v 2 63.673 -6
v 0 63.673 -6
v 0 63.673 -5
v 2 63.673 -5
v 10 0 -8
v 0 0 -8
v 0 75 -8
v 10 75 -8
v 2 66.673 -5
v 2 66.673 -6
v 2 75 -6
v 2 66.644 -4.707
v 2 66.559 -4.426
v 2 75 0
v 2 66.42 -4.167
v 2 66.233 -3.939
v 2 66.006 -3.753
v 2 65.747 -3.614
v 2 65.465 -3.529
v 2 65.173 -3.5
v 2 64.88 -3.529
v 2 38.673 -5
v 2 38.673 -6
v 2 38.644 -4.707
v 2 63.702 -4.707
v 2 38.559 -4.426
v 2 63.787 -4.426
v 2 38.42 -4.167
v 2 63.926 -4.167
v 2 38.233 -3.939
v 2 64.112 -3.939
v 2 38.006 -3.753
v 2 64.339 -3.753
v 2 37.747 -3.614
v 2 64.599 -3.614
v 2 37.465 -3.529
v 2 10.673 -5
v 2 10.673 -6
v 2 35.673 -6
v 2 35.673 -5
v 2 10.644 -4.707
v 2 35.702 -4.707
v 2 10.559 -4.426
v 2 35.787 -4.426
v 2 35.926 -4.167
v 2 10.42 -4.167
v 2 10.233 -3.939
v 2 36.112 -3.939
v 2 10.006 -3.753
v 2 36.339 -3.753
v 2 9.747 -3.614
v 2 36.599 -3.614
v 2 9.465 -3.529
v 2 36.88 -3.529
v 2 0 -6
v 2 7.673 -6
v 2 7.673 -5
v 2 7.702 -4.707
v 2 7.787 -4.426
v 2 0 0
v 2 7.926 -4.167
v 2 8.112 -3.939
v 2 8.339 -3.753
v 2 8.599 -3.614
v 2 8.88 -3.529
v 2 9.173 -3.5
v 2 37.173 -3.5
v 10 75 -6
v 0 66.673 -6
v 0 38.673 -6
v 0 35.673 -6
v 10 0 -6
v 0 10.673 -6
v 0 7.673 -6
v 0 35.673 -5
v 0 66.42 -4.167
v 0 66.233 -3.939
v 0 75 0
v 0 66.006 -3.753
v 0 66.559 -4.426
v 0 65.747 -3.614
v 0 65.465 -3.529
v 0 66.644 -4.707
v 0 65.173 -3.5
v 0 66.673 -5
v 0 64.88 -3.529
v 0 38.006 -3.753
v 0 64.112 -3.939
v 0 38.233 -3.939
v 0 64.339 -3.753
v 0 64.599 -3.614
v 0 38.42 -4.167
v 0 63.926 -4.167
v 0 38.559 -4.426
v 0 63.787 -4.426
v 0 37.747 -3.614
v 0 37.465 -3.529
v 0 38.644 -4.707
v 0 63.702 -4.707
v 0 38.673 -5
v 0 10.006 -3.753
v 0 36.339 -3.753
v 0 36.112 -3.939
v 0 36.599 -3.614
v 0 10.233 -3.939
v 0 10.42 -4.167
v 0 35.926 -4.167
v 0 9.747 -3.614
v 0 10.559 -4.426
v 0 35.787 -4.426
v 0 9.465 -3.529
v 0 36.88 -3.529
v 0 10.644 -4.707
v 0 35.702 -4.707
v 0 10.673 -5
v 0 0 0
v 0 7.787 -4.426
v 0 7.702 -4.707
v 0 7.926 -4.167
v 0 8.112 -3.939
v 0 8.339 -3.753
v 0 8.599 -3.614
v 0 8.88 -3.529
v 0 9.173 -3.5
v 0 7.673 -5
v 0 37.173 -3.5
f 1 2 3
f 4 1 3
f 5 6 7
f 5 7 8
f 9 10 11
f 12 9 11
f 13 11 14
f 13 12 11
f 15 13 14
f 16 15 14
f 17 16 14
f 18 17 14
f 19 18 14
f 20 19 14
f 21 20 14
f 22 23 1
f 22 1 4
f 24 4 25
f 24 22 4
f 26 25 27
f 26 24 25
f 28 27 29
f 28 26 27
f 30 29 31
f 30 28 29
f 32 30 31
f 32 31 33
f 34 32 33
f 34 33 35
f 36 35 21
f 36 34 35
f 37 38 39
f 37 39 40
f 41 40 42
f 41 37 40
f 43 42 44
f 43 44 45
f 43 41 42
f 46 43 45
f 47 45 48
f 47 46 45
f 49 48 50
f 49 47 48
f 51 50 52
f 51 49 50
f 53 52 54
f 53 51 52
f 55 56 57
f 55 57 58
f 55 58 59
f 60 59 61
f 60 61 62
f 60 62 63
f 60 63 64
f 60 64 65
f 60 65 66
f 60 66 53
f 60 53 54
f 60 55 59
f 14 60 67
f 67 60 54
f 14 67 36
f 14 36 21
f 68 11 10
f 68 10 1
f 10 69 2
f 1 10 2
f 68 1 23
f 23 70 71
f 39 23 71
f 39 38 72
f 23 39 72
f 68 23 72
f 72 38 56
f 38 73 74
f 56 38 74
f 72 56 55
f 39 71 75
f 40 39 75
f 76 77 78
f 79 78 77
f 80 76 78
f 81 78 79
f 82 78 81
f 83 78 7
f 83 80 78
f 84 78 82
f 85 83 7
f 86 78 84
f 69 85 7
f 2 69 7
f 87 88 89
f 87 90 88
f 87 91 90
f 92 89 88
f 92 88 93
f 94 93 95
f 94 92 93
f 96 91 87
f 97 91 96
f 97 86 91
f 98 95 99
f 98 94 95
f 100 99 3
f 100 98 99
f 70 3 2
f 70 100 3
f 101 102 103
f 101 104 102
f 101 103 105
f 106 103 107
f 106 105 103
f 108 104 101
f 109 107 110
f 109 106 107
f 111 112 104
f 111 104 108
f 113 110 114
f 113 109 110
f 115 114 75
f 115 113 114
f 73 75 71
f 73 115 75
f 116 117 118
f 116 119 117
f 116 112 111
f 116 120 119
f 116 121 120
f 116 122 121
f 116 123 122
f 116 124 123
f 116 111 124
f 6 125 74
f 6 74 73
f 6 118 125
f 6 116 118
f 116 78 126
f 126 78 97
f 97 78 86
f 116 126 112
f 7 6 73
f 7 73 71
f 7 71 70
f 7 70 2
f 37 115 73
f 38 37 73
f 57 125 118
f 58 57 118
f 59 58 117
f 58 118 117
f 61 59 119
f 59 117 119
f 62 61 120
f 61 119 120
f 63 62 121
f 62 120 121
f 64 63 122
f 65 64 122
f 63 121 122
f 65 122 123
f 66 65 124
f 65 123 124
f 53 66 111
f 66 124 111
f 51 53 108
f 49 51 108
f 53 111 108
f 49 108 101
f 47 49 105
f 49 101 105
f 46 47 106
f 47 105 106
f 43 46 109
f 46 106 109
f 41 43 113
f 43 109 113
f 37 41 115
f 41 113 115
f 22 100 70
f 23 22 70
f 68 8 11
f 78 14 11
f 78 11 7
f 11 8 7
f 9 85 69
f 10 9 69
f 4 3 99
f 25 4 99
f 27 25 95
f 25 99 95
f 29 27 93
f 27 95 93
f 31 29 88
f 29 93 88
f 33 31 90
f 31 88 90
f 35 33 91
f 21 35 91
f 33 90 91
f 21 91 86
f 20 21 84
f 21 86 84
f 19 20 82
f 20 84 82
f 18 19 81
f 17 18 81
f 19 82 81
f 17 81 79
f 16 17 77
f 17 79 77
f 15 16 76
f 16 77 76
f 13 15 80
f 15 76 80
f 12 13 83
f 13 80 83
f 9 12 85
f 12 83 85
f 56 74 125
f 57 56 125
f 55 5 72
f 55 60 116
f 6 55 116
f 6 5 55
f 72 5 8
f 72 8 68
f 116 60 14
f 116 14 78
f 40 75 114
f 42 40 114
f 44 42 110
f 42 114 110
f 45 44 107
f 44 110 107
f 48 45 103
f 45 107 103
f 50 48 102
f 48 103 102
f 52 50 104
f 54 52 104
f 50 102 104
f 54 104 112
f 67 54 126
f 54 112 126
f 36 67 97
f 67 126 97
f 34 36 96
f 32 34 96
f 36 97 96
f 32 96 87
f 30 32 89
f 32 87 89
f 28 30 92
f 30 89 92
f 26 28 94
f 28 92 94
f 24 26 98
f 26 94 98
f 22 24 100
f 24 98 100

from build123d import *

# Parameters (mm, degrees)
BOSS_EXTRU_1_DEPTH           = 75
ENL_V_MAT_EXTRU_9_DEPTH      = 1
ENL_V_MAT_EXTRU_9_DEPTH_BACK = 3


with BuildPart() as part:
    # Esquisse2 → Boss.-Extru.1 (new body)
    with BuildSketch(Plane(origin=(0, 0, 0), x_dir=(1, 0, 0), z_dir=(0, 1, 0))):
        Polygon((0, 0), (0, 8), (10, 8), (10, 6), (2, 6), (2, 0), align=None)
    extrude(amount=BOSS_EXTRU_1_DEPTH)

    # Esquisse3 → Enlèv. mat.-Extru.9 (cut, two sides: drawn at the far end of the back side and taken through both)
    with BuildSketch(Plane(origin=(2, 0, 0), x_dir=(0, 0, -1), z_dir=(1, 0, 0)).offset(-ENL_V_MAT_EXTRU_9_DEPTH_BACK)):
        with BuildLine():
            Line((6, 38.672788966), (6, 35.672788966))
            Line((6, 35.672788966), (5, 35.672788966))
            ThreePointArc((5, 35.672788966), (3.5, 37.172788966), (5, 38.672788966))
            Line((5, 38.672788966), (6, 38.672788966))
        make_face()
        with BuildLine():
            Line((6, 63.672788966), (5, 63.672788966))
            ThreePointArc((5, 63.672788966), (3.5, 65.172788966), (5, 66.672788966))
            Line((5, 66.672788966), (6, 66.672788966))
            Line((6, 66.672788966), (6, 63.672788966))
        make_face()
        with BuildLine():
            Line((6, 7.672788966), (5, 7.672788966))
            ThreePointArc((5, 7.672788966), (3.5, 9.172788966), (5, 10.672788966))
            Line((5, 10.672788966), (6, 10.672788966))
            Line((6, 10.672788966), (6, 7.672788966))
        make_face()
    extrude(amount=ENL_V_MAT_EXTRU_9_DEPTH + ENL_V_MAT_EXTRU_9_DEPTH_BACK, mode=Mode.SUBTRACT)


solid = part.part
